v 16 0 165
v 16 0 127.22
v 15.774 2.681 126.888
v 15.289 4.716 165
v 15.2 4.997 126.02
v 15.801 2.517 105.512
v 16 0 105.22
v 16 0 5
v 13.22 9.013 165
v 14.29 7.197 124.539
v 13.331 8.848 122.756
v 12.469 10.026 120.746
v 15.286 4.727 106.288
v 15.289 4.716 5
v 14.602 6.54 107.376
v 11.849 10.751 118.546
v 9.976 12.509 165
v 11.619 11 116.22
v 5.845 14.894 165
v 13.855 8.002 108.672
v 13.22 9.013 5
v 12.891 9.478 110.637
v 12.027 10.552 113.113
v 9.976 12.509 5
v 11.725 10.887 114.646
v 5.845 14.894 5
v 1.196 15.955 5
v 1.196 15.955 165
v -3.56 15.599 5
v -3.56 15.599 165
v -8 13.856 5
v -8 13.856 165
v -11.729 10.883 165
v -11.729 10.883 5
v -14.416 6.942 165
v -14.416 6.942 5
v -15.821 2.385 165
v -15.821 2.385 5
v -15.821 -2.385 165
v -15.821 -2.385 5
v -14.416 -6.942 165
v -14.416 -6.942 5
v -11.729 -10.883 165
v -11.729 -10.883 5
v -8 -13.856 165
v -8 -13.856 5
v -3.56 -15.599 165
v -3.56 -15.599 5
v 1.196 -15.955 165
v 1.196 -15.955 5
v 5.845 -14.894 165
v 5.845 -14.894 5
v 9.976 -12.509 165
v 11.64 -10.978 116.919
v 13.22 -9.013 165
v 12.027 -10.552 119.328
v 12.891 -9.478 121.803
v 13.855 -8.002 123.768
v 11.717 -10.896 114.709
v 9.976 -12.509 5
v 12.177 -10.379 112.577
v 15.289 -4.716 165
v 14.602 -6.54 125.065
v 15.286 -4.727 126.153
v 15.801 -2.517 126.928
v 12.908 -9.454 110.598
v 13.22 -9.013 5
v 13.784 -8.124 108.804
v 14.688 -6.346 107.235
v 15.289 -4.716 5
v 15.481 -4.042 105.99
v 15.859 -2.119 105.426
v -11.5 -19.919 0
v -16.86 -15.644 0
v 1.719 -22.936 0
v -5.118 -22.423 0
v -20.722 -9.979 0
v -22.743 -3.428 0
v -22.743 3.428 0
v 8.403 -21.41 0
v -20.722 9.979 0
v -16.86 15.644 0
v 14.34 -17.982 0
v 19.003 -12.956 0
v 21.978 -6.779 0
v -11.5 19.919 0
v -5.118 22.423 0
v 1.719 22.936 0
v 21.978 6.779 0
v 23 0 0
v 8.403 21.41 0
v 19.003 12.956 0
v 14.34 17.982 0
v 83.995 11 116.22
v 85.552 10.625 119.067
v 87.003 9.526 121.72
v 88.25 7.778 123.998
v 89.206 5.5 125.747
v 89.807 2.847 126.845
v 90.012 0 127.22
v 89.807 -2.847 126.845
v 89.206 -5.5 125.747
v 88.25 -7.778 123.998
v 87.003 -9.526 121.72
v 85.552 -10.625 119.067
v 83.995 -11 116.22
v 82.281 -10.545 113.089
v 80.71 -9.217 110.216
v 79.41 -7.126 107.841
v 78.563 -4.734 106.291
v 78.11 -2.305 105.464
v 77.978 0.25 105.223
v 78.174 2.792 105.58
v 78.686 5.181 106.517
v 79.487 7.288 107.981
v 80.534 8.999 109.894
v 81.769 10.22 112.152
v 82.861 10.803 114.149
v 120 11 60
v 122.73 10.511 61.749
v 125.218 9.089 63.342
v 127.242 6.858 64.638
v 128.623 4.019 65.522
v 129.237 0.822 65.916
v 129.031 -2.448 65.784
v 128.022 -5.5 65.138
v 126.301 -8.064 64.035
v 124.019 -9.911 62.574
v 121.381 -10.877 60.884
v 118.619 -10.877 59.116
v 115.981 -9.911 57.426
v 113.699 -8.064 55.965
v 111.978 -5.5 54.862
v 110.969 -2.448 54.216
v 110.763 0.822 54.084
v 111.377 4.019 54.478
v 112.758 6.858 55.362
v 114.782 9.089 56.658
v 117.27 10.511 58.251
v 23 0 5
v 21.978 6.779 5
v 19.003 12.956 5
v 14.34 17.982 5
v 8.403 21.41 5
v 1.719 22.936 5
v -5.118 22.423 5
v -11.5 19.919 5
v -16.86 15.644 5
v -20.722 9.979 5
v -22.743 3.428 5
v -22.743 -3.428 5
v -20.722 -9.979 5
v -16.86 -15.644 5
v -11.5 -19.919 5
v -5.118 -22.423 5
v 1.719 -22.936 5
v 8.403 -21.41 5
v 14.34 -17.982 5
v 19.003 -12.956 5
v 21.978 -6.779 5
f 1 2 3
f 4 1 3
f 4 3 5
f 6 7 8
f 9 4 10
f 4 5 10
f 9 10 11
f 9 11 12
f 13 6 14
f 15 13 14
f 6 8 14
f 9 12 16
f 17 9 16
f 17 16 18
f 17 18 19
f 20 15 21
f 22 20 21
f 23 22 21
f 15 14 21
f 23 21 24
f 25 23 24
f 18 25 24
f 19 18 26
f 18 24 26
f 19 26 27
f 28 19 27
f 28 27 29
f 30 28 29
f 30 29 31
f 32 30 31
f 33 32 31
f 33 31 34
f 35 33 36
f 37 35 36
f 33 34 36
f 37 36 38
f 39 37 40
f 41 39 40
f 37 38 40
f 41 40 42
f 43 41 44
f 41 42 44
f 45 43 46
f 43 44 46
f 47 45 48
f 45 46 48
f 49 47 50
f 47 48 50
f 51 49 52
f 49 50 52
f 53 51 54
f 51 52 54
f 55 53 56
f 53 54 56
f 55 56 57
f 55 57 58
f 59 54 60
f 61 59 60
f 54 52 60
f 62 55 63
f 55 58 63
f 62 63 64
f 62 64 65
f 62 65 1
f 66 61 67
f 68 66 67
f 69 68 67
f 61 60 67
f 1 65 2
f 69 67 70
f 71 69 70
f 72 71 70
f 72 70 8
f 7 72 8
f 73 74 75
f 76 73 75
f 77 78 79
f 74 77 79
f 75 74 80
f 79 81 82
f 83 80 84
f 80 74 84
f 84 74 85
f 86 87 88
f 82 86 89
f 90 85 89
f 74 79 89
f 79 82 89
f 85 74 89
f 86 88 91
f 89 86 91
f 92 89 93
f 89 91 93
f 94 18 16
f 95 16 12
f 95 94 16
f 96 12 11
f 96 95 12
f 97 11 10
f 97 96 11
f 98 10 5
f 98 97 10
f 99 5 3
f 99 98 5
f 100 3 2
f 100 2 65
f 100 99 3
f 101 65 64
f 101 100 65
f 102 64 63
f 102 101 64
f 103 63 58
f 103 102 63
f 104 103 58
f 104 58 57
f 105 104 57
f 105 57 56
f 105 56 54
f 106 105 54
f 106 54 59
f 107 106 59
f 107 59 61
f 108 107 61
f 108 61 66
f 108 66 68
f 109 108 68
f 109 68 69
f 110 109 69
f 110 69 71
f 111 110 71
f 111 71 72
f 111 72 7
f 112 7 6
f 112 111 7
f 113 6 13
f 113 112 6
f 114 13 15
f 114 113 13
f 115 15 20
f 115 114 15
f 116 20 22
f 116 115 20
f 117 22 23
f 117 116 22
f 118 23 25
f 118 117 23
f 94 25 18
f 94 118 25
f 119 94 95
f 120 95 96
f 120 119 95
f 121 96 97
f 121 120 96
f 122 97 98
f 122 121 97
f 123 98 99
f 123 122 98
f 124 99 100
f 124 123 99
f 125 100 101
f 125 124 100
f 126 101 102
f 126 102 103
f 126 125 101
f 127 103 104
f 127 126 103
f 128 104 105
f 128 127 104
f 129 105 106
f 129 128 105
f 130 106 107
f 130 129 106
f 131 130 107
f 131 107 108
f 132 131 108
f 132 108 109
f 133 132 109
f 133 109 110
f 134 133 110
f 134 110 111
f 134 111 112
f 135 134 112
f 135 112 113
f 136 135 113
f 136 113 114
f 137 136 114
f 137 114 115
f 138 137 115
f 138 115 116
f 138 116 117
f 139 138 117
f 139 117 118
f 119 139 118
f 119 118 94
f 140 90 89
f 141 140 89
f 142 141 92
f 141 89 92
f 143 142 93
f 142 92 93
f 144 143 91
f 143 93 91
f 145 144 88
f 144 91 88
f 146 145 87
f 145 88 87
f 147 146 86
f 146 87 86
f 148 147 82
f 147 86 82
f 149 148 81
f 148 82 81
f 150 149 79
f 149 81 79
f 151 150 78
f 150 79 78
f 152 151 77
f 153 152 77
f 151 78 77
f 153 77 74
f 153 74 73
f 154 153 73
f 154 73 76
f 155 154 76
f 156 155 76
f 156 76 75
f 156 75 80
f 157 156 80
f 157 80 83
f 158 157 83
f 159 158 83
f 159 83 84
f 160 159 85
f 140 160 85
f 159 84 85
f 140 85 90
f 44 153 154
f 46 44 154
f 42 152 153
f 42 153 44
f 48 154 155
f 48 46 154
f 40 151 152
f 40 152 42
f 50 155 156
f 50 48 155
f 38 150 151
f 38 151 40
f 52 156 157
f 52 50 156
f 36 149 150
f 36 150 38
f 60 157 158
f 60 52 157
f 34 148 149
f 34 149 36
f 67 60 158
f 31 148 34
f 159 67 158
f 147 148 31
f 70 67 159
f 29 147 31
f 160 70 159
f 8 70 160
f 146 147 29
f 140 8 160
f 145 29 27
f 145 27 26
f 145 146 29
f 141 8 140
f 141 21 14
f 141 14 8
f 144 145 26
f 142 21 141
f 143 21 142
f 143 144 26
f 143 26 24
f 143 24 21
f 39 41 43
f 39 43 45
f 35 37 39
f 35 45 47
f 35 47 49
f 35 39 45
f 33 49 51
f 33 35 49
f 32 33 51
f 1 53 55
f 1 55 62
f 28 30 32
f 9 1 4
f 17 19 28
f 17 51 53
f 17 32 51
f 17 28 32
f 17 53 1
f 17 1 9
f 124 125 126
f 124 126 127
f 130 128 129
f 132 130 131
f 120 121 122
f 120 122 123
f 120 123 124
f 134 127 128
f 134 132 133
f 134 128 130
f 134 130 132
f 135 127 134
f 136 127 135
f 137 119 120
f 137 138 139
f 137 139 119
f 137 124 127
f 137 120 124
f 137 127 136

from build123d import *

# Parameters (mm, degrees)
F0_R     = 16
F1_DEPTH = 165
F4_R     = 11
F7_R     = 23
F8_DEPTH = 5


with BuildPart() as f1:
    # F0 (on Top) → F1 (new body)
    with BuildSketch(Plane.XY):
        Circle(F0_R)
    extrude(amount=F1_DEPTH)

    # F6: sweep along a path in F5
    with BuildLine(Plane.XZ) as f6_path:
        Line((0, 116.2202451894), (83.9946197184, 116.2202451894))
        Line((83.9946197184, 116.2202451894), (120, 60))
    # F4 (on Right) → F6 (sweep)
    with BuildSketch(Plane.YZ):
        with Locations((0, 116.2202451894)):
            Circle(F4_R)
    sweep(path=f6_path.line, transition=Transition.RIGHT)

    # F7 (on Top) → F8 (join)
    with BuildSketch(Plane.XY):
        Circle(F7_R)
    extrude(amount=F8_DEPTH)


solid = f1.part
